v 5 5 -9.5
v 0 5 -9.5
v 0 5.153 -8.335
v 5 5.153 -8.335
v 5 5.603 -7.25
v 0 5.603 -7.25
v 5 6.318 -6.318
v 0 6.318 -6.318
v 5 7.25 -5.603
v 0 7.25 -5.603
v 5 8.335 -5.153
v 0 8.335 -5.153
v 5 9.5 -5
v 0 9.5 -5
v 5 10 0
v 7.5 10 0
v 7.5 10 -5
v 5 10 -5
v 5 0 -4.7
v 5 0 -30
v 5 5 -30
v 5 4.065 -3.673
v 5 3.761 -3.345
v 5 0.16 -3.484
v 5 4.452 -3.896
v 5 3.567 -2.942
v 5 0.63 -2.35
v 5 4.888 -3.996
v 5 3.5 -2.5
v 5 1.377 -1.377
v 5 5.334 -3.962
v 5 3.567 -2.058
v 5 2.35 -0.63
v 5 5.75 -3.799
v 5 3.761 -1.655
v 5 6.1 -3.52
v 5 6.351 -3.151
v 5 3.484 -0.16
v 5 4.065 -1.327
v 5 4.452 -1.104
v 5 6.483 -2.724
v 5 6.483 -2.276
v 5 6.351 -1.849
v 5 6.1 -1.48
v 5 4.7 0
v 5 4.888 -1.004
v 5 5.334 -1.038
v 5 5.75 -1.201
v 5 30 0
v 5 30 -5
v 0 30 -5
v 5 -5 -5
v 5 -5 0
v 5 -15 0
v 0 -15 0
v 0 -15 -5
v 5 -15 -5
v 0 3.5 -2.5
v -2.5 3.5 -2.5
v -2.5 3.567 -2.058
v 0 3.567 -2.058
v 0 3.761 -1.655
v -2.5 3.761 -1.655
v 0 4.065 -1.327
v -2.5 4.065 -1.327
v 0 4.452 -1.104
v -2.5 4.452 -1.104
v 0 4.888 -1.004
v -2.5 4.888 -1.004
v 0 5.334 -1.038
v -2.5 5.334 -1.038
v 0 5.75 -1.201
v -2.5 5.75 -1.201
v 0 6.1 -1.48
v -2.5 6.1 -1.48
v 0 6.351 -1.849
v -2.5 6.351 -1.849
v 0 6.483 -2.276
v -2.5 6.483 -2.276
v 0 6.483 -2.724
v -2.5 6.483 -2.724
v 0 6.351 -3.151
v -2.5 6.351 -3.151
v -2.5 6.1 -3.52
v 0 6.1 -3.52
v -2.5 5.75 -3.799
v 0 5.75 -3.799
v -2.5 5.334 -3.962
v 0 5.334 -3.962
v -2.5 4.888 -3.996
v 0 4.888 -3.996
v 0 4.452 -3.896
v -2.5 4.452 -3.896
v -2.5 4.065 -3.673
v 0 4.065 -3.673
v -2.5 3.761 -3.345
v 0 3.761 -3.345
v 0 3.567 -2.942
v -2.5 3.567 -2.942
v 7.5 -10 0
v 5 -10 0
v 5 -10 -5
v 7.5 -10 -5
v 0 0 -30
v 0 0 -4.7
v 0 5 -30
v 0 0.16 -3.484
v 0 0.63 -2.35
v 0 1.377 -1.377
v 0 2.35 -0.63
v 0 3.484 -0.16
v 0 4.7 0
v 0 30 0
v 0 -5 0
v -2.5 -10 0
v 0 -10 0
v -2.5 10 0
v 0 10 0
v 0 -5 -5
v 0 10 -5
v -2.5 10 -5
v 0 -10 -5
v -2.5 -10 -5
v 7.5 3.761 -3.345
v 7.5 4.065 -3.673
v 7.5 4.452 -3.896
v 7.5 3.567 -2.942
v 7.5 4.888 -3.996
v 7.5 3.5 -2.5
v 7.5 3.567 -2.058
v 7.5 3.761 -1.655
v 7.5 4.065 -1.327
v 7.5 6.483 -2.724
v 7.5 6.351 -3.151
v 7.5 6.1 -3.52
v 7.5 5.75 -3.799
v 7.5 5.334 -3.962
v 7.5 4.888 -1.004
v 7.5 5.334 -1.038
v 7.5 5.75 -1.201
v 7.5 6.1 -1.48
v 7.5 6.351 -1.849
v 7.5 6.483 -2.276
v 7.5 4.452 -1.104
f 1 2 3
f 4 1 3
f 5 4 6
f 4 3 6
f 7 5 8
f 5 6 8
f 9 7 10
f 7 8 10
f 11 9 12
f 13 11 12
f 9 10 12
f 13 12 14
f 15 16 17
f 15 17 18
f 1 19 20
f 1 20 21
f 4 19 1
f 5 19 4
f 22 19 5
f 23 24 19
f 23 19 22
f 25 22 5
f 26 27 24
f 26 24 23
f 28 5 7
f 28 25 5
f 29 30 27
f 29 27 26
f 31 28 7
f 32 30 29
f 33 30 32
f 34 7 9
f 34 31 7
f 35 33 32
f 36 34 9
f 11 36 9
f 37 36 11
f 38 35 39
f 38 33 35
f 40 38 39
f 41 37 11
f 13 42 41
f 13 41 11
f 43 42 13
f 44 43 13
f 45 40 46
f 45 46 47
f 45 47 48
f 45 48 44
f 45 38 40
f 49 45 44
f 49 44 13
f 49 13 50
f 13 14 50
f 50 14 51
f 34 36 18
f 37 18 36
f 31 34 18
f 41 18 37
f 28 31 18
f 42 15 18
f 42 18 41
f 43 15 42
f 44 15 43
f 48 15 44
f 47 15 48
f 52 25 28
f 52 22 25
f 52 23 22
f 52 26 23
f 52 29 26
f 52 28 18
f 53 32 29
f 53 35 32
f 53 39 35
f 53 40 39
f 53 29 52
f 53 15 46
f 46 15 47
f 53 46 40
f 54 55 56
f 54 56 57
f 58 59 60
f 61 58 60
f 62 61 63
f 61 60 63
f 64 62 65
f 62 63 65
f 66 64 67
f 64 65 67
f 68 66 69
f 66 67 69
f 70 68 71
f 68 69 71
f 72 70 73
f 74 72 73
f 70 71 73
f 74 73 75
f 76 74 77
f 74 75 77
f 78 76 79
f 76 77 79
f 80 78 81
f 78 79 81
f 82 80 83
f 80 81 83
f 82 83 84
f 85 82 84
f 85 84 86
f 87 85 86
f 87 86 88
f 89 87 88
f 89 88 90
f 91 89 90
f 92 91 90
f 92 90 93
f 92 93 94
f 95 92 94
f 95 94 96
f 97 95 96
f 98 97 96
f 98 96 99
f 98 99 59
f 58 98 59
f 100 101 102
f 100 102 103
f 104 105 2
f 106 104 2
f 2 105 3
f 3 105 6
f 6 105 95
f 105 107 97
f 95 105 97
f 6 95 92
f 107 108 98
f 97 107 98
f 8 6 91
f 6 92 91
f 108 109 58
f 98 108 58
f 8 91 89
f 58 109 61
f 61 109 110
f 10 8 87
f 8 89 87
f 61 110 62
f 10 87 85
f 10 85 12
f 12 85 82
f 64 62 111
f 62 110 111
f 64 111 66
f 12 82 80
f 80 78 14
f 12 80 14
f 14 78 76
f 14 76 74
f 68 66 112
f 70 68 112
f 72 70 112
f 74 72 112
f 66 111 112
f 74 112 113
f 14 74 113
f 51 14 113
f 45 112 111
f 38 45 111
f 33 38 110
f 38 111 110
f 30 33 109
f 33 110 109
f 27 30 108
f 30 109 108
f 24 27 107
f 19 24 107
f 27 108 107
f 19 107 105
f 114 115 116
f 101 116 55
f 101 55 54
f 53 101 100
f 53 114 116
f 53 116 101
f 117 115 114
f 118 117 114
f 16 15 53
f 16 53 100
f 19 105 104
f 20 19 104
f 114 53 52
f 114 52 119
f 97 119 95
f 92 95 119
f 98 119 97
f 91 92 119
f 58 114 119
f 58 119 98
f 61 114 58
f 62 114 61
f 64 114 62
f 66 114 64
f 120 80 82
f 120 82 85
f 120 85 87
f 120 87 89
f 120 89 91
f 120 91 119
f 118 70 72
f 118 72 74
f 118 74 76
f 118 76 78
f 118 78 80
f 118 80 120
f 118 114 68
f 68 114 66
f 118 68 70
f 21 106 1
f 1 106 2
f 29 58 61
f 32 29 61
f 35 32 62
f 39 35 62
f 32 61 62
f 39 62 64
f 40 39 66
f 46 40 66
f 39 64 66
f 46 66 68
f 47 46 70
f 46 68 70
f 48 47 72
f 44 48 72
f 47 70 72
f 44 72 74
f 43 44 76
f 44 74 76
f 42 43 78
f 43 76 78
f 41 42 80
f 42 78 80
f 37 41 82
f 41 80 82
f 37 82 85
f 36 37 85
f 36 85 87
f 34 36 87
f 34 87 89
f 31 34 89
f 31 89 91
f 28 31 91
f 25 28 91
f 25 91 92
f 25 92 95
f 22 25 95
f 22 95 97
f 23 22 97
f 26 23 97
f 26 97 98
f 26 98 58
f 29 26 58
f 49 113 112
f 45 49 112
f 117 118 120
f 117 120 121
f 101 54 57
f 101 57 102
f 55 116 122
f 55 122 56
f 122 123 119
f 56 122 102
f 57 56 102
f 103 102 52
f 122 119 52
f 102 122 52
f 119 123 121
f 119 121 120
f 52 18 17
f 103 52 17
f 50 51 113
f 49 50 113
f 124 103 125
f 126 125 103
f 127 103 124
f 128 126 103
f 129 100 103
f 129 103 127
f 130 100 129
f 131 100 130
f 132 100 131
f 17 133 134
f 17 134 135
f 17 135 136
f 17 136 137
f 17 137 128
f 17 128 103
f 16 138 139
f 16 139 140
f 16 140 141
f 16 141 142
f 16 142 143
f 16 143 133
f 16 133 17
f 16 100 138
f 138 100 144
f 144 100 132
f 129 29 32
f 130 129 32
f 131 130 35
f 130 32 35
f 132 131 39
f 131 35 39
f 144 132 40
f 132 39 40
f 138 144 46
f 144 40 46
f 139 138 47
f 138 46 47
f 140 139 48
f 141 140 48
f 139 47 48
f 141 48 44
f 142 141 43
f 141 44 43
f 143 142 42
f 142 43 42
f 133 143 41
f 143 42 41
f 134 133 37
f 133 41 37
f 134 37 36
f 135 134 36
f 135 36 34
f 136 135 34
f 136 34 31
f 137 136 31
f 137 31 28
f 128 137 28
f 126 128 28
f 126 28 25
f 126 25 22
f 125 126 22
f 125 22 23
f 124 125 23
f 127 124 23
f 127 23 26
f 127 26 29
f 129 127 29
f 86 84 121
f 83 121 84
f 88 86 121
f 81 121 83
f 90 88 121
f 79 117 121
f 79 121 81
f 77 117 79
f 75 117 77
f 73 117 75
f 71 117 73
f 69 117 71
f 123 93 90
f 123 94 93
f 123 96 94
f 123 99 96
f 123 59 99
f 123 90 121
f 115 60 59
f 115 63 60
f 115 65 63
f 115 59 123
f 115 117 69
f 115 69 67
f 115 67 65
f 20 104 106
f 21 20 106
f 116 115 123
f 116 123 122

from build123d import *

# Parameters (mm, degrees)
F1_DEPTH = 5
F3_DEPTH = 5
F4_R     = 1.5
F5_DEPTH = 10


with BuildPart() as f1:
    # F0 (on Right) → F1 (new body)
    with BuildSketch(Plane.YZ):
        with BuildLine():
            Line((30, 0), (4.7, 0))
            ThreePointArc((4.7, 0), (1.376598, -1.376598), (0, -4.7))
            Line((0, -4.7), (0, -5))
            Line((0, -5), (0, -30))
            Line((0, -30), (5, -30))
            Line((5, -30), (5, -9.5))
            ThreePointArc((5, -9.5), (6.318019, -6.318019), (9.5, -5))
            Line((9.5, -5), (30, -5))
            Line((30, -5), (30, 0))
        make_face()
    extrude(amount=F1_DEPTH)


with BuildPart() as f3:
    # F2 (on face) → F3 (new body, through all)
    with BuildSketch(Plane.XY):
        Polygon((7.5, 10), (5, 10), (5, -5), (0, -5), (0, 10), (-2.5, 10), (-2.5, -10), (0, -10), (0, -15), (5, -15), (5, -10), (7.5, -10), align=None)
    extrude(amount=-F3_DEPTH)


with BuildPart() as f5_tool:
    # F4 (on face) → F5 (new body, through all)
    with BuildSketch(Plane(origin=(-2.5, 0, 0), x_dir=(0, -1, 0), z_dir=(-1, 0, 0))):
        with Locations((-5, -2.5)):
            Circle(F4_R)
    extrude(amount=-F5_DEPTH)


with BuildPart() as f1_1:
    add(f1.part)

    # F5: cut by f5_tool
    add(f5_tool.part, mode=Mode.SUBTRACT)


with BuildPart() as f3_1:
    add(f3.part)

    # F5: cut by f5_tool
    add(f5_tool.part, mode=Mode.SUBTRACT)


solid = Compound([f1_1.part, f3_1.part])
